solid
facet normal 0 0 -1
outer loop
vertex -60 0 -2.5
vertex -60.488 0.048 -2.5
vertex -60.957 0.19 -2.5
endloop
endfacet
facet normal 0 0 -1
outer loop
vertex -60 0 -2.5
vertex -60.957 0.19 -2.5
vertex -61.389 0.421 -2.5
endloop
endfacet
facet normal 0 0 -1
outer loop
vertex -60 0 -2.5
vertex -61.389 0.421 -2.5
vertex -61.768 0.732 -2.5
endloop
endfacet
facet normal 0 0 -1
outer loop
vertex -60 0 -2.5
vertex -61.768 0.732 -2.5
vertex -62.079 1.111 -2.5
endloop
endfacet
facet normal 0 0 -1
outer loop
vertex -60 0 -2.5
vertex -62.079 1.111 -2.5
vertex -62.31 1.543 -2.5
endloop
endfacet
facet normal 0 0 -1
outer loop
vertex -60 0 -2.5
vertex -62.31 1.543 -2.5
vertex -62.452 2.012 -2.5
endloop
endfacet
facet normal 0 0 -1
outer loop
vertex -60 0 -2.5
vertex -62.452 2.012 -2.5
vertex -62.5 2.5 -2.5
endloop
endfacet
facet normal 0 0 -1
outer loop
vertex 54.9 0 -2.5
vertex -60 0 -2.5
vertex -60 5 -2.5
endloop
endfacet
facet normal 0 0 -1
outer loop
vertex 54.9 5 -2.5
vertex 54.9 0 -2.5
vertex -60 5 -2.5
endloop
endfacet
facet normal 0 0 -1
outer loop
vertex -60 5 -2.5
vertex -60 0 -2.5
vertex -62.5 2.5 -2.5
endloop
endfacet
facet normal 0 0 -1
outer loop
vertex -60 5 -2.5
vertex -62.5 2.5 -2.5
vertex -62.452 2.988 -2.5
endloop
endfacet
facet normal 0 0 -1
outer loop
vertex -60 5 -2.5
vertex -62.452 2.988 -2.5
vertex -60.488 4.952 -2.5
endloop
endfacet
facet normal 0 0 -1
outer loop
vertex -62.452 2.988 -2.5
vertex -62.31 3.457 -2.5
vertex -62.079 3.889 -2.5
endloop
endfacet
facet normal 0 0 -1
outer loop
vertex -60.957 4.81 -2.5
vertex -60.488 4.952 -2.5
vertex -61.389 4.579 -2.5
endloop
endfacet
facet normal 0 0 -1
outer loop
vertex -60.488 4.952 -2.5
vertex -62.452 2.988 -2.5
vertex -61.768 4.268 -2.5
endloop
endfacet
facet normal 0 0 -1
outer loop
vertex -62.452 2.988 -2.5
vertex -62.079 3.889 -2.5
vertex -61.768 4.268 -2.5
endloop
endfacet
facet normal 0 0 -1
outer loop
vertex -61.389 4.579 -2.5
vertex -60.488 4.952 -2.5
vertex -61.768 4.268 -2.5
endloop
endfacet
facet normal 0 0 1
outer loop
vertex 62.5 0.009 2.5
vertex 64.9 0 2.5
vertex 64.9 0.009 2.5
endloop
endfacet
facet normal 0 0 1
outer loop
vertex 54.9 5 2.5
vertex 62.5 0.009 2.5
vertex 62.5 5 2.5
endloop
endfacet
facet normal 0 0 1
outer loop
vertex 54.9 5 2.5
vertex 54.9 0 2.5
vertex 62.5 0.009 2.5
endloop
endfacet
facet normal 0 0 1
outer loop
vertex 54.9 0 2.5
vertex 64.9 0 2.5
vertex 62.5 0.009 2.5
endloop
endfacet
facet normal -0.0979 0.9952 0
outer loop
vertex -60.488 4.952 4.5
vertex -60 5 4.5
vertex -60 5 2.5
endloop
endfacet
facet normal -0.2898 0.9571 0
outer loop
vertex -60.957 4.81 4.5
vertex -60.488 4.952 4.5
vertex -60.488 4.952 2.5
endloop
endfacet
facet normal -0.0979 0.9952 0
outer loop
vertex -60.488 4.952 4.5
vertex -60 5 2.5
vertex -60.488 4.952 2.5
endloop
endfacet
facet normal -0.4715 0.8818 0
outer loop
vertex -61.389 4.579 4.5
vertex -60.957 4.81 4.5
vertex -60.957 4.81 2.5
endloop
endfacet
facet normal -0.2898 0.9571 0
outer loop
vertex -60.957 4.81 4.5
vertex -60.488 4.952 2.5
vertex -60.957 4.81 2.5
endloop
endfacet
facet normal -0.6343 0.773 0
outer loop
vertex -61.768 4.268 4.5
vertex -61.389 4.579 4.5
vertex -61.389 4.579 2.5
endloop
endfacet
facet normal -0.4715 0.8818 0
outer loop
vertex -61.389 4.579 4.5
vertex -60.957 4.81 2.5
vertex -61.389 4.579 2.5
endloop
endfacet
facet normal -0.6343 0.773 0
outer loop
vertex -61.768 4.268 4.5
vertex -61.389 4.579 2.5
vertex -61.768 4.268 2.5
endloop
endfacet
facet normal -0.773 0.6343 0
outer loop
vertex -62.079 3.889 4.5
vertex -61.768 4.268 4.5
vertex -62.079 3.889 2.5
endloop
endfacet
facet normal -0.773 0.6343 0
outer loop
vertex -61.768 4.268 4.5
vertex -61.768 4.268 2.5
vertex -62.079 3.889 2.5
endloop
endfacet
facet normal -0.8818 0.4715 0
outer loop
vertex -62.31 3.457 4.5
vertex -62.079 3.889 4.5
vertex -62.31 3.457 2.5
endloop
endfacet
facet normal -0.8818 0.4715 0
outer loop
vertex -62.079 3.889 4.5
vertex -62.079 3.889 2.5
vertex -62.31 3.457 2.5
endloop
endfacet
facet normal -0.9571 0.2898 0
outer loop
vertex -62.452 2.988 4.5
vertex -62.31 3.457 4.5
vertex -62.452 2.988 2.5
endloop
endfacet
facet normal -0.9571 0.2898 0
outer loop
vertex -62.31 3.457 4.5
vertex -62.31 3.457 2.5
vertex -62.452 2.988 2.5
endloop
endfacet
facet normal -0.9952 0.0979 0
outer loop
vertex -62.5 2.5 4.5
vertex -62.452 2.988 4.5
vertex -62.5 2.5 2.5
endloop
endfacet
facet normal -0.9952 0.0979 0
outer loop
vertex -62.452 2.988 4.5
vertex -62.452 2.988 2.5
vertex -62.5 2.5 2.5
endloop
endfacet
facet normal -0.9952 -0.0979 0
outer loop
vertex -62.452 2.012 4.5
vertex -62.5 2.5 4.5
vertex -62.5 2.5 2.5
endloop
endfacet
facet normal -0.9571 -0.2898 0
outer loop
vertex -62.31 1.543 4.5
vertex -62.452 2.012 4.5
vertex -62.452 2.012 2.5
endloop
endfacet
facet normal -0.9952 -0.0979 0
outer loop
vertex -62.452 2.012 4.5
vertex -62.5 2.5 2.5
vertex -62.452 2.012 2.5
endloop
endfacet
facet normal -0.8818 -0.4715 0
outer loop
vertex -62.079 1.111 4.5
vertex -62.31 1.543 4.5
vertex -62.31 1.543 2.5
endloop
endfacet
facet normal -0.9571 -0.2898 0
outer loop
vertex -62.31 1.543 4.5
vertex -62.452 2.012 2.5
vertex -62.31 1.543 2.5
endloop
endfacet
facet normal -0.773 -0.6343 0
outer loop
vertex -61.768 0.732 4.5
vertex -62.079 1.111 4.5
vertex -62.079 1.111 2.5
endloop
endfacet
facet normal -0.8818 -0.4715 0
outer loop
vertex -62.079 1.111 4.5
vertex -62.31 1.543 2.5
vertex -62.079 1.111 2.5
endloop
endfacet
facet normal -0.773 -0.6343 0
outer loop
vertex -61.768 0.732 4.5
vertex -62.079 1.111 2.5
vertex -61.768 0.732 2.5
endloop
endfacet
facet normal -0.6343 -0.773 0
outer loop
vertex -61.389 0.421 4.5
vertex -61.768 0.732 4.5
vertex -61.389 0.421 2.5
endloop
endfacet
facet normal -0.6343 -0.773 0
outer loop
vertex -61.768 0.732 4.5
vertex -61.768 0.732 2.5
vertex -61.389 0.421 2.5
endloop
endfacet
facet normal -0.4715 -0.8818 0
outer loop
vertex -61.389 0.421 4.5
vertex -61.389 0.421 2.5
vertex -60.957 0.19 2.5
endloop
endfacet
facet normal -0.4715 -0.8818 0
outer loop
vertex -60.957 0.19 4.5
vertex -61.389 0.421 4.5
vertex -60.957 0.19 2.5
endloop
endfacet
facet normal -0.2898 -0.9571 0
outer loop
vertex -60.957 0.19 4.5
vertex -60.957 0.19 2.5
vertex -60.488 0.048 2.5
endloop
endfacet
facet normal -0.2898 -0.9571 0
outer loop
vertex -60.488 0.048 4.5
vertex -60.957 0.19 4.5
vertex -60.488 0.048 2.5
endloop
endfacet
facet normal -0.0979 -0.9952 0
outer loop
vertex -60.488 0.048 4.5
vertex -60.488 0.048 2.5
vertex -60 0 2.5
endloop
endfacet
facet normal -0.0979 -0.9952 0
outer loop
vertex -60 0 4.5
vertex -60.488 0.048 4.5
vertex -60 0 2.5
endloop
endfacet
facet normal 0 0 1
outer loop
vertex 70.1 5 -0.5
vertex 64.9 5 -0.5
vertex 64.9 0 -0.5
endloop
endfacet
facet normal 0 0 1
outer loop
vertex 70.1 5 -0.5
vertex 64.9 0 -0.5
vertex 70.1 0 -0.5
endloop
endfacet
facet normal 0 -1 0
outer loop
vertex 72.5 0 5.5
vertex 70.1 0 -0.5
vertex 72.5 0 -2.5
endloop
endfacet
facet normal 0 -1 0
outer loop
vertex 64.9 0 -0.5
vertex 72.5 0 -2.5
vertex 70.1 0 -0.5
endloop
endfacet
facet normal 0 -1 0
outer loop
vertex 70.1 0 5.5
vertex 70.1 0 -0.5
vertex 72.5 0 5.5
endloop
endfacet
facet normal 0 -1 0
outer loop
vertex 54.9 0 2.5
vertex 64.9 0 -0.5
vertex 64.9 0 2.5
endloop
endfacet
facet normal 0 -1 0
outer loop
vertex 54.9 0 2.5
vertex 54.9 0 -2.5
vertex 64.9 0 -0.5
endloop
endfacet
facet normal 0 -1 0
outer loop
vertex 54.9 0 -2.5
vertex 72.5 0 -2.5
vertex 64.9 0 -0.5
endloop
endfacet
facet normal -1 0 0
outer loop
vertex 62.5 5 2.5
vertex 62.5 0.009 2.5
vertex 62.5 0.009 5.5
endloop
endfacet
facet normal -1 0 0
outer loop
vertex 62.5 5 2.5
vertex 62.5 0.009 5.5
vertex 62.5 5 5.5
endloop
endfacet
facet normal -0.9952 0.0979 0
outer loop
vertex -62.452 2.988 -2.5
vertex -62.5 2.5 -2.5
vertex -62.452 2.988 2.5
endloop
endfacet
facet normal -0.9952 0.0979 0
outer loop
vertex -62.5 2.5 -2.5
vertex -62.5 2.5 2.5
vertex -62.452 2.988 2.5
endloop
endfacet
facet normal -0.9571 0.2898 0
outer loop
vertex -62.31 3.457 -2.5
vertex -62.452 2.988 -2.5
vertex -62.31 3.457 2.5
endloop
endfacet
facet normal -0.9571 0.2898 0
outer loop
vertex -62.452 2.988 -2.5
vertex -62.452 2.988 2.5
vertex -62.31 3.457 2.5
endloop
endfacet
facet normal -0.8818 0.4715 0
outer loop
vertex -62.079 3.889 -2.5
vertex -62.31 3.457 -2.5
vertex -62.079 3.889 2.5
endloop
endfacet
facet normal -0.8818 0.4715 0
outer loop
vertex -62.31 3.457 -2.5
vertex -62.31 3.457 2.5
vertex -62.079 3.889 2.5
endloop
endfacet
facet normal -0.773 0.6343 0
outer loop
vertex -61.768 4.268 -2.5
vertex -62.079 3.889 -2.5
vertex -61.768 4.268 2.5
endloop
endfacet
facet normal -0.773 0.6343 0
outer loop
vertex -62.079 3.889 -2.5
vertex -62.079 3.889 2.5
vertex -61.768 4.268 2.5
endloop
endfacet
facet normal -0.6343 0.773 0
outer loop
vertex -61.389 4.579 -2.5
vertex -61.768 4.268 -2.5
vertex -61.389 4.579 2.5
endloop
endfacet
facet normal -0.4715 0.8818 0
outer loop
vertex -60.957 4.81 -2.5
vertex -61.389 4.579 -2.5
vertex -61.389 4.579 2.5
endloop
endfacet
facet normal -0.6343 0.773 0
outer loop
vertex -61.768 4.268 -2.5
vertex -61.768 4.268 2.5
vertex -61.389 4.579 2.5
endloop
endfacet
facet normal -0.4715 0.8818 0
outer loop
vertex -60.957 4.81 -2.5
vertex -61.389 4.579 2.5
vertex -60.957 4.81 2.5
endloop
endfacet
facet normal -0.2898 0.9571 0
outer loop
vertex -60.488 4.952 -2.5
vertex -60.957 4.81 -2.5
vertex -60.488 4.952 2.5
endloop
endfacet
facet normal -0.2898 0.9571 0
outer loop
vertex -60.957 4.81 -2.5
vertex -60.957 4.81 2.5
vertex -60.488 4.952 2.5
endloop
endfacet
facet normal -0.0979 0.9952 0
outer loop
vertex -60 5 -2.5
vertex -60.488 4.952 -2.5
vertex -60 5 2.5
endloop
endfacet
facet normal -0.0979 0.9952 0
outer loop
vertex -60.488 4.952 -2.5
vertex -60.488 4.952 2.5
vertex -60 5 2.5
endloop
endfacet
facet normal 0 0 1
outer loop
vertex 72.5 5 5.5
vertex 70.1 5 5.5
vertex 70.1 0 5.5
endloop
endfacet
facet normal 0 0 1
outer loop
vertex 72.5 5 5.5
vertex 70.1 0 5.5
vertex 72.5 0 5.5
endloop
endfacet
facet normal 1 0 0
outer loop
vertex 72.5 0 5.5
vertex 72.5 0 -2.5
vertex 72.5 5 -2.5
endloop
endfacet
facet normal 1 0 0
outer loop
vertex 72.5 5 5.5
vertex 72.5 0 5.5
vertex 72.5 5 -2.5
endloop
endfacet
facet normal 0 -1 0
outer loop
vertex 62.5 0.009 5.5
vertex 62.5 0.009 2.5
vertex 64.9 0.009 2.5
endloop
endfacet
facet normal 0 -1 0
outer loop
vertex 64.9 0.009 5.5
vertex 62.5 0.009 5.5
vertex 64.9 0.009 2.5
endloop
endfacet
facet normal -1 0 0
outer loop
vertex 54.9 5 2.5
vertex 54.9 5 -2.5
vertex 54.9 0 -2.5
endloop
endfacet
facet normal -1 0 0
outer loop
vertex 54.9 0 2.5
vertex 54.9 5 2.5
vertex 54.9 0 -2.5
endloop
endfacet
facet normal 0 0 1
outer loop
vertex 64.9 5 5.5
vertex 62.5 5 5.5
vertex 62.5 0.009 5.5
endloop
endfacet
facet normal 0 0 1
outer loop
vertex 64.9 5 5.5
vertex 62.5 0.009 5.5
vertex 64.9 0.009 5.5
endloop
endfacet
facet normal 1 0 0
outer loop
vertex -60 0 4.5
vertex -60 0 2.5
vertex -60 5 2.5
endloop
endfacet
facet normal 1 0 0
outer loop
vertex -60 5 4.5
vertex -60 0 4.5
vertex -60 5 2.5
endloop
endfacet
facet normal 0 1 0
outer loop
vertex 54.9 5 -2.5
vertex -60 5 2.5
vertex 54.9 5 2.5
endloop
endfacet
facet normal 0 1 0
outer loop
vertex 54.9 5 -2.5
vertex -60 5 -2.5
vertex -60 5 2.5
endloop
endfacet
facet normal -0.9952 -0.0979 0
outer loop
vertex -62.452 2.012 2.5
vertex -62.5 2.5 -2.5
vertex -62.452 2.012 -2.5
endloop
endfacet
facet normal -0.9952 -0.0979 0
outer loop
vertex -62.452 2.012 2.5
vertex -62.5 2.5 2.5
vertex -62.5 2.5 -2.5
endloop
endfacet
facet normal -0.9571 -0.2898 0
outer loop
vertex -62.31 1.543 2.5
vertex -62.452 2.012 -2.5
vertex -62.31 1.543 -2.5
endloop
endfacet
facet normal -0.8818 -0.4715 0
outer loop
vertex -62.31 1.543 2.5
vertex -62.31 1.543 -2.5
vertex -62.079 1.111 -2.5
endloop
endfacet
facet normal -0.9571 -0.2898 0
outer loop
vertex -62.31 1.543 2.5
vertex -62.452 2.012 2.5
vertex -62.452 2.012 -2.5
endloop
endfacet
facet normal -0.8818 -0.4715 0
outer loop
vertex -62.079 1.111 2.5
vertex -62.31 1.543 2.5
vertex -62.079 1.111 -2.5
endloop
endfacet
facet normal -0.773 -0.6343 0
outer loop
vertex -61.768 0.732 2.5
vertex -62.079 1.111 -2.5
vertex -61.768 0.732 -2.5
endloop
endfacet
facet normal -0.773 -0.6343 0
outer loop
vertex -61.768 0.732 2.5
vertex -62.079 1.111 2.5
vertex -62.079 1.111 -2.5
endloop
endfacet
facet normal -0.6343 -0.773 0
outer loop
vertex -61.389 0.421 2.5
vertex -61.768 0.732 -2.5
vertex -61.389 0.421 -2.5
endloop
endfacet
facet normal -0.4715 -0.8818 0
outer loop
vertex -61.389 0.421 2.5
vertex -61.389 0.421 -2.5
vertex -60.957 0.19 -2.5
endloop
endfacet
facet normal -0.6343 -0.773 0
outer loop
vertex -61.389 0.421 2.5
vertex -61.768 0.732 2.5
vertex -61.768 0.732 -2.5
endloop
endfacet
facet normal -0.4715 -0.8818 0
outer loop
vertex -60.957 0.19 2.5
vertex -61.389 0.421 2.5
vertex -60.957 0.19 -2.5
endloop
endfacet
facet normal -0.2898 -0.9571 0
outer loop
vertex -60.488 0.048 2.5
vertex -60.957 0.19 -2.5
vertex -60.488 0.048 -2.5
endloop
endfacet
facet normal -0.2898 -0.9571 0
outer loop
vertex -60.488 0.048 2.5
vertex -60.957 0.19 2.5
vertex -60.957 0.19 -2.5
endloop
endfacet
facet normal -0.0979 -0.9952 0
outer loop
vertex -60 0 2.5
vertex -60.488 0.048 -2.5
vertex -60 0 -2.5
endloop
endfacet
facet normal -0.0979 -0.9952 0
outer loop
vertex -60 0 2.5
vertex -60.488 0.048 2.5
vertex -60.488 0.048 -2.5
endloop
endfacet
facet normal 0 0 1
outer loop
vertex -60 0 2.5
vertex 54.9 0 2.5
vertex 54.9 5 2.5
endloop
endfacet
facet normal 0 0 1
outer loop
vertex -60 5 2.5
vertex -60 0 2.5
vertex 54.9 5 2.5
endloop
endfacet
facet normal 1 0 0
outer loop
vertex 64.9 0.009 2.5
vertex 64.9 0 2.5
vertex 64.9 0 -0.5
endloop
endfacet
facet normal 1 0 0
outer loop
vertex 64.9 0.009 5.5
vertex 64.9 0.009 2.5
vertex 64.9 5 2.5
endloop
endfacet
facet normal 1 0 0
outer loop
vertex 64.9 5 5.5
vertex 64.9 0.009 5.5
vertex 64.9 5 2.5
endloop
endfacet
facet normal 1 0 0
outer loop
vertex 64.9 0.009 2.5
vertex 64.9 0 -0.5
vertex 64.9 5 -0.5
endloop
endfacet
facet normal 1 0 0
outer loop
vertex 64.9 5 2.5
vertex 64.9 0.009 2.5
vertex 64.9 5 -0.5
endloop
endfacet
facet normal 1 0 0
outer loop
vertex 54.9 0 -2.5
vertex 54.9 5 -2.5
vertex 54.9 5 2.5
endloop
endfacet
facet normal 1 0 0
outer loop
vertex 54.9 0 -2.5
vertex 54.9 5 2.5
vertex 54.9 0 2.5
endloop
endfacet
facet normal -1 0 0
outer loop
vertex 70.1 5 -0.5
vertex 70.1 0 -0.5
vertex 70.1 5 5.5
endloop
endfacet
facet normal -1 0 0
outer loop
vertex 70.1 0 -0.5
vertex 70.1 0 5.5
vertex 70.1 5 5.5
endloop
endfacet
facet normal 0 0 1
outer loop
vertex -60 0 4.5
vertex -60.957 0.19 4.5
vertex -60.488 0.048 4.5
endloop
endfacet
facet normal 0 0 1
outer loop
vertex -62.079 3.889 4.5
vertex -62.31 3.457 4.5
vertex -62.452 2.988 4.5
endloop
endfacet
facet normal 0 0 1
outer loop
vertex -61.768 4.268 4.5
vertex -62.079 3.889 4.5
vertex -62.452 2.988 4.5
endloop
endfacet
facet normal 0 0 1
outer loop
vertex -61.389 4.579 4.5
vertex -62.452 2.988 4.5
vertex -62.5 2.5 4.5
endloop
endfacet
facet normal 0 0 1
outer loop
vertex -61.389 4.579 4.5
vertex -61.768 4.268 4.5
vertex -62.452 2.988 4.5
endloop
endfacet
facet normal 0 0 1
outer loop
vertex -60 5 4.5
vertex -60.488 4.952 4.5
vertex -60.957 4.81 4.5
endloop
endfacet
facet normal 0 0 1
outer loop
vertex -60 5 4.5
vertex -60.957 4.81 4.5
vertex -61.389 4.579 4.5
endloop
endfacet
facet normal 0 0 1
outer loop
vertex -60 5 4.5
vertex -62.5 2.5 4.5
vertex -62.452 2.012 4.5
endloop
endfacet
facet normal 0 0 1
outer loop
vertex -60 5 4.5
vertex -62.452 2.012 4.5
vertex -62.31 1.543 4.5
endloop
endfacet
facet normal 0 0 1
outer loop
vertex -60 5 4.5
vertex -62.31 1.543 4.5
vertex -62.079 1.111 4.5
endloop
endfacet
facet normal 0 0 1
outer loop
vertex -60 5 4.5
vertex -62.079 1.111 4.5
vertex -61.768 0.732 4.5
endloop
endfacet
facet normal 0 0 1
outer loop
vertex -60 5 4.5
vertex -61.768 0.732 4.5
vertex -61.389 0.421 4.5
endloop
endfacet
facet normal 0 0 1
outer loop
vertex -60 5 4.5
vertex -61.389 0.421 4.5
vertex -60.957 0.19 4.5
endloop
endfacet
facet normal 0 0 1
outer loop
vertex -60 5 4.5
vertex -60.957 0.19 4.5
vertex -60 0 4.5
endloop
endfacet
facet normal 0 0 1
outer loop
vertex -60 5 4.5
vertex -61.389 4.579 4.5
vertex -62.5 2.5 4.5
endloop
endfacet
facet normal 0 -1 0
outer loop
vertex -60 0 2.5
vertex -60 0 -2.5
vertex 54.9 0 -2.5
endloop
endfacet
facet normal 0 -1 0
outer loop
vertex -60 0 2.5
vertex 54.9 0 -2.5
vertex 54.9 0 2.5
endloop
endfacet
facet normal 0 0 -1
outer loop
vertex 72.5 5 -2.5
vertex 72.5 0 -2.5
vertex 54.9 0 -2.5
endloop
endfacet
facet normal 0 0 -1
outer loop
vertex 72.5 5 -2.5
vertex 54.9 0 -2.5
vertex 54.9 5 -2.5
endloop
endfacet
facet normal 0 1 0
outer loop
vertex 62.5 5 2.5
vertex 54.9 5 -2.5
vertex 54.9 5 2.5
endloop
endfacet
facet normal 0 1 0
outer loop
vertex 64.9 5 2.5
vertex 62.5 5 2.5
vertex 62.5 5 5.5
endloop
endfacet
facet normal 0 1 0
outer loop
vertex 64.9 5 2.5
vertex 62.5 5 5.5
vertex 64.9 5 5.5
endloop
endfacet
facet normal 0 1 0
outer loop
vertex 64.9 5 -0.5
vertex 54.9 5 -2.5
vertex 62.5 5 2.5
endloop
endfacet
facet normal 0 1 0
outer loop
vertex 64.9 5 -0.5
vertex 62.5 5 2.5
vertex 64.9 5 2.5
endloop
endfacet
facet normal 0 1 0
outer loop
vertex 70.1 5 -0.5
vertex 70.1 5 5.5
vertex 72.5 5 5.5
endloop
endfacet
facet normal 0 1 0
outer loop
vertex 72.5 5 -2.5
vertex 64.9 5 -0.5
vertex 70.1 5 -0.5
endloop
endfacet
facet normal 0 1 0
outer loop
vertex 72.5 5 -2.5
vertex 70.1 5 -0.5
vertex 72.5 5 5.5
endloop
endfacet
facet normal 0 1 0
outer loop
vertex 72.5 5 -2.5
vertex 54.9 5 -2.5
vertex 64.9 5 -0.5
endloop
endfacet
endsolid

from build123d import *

# Parameters (mm, degrees)
SKETCH1_W              = 125
SKETCH1_H              = 5
BOSS_EXTRUDE1_DEPTH    = 5
FILLET1_R              = 2.5
SKETCH3_W              = 5
SKETCH3_H              = 5
BOSS_EXTRUDE2_DEPTH    = 10
SKETCH4_W              = 5.2
SKETCH4_H              = 5
CUT_EXTRUDE1_DEPTH     = 3
BOSS_EXTRUDE3_DEPTH    = 2
SKETCH7_W              = 2.4
SKETCH7_H              = 4.991403031
SKETCH7_H_2            = 5
BOSS_EXTRUDE4_DEPTH    = 3
SPLIT1_SURFACE_1_BACK  = 136.329
SPLIT1_SURFACE_1_DEPTH = 272.658
SPLIT1_SURFACE_2_BACK  = 136.329
SPLIT1_SURFACE_2_DEPTH = 272.658


with BuildPart() as part:
    # Sketch1 → Boss-Extrude1 (new body)
    with BuildSketch(Plane(origin=(0, 0, 0), x_dir=(-1, 0, 0), z_dir=(0, 1, 0))):
        Rectangle(SKETCH1_W, SKETCH1_H)
    extrude(amount=BOSS_EXTRUDE1_DEPTH)

    # Fillet1
    fillet1_edges = [part.edges().sort_by_distance(p)[0] for p in [
        (-62.5, 5, 0),
        (-62.5, 0, 0),
    ]]
    fillet(fillet1_edges, radius=FILLET1_R - 0.0001)  # a hair under: the kernel refuses the full size

    # Sketch3 → Boss-Extrude2 (add)
    with BuildSketch(Plane.YZ.offset(62.5)):
        with Locations((2.5, 0)):
            Rectangle(SKETCH3_W, SKETCH3_H)
    extrude(amount=BOSS_EXTRUDE2_DEPTH)

    # Sketch4 → Cut-Extrude1 (cut)
    with BuildSketch(Plane.XY.offset(2.5)):
        with Locations((67.5, 2.5)):
            Rectangle(SKETCH4_W, SKETCH4_H)
    extrude(amount=-CUT_EXTRUDE1_DEPTH, mode=Mode.SUBTRACT)

    # Sketch5 → Boss-Extrude3 (add)
    with BuildSketch(Plane.XY.offset(2.5)):
        with BuildLine():
            Line((-60, 0), (-60, 5))
            ThreePointArc((-60, 5), (-62.5, 2.5), (-60, 0))
        make_face()
    extrude(amount=BOSS_EXTRUDE3_DEPTH)

    # Sketch7 → Boss-Extrude4 (add)
    with BuildSketch(Plane.XY.offset(2.5)):
        with Locations((63.7, 2.504298485)):
            Rectangle(SKETCH7_W, SKETCH7_H)
        with Locations((71.3, 2.5)):
            Rectangle(SKETCH7_W, SKETCH7_H_2)
    extrude(amount=BOSS_EXTRUDE4_DEPTH)


with BuildPart() as body_2:
    # Split1: the piece behind the surface
    add(part.part)
    # Split1 surface: a surface, the sketch's curves swept straight by 272.658 mm
    with BuildLine(Plane.XY.offset(2.5).offset(-SPLIT1_SURFACE_1_BACK), mode=Mode.PRIVATE) as split1_surface_1_path:
        Line((54.9, 5), (54.9, 0))
    split1_surface_1 = Shell.extrude(split1_surface_1_path.wire(), (0 * SPLIT1_SURFACE_1_DEPTH, 0 * SPLIT1_SURFACE_1_DEPTH, 1 * SPLIT1_SURFACE_1_DEPTH))
    split(bisect_by=split1_surface_1, keep=Keep.BOTTOM)


with BuildPart() as part_1:
    add(part.part)

    # Split1: split by a surface, the side it looks to stays
    # Split1 surface: a surface, the sketch's curves swept straight by 272.658 mm
    with BuildLine(Plane.XY.offset(2.5).offset(-SPLIT1_SURFACE_2_BACK), mode=Mode.PRIVATE) as split1_surface_2_path:
        Line((54.9, 5), (54.9, 0))
    split1_surface_2 = Shell.extrude(split1_surface_2_path.wire(), (0 * SPLIT1_SURFACE_2_DEPTH, 0 * SPLIT1_SURFACE_2_DEPTH, 1 * SPLIT1_SURFACE_2_DEPTH))
    split(bisect_by=split1_surface_2, keep=Keep.TOP)


solid = Compound([body_2.part, part_1.part])
